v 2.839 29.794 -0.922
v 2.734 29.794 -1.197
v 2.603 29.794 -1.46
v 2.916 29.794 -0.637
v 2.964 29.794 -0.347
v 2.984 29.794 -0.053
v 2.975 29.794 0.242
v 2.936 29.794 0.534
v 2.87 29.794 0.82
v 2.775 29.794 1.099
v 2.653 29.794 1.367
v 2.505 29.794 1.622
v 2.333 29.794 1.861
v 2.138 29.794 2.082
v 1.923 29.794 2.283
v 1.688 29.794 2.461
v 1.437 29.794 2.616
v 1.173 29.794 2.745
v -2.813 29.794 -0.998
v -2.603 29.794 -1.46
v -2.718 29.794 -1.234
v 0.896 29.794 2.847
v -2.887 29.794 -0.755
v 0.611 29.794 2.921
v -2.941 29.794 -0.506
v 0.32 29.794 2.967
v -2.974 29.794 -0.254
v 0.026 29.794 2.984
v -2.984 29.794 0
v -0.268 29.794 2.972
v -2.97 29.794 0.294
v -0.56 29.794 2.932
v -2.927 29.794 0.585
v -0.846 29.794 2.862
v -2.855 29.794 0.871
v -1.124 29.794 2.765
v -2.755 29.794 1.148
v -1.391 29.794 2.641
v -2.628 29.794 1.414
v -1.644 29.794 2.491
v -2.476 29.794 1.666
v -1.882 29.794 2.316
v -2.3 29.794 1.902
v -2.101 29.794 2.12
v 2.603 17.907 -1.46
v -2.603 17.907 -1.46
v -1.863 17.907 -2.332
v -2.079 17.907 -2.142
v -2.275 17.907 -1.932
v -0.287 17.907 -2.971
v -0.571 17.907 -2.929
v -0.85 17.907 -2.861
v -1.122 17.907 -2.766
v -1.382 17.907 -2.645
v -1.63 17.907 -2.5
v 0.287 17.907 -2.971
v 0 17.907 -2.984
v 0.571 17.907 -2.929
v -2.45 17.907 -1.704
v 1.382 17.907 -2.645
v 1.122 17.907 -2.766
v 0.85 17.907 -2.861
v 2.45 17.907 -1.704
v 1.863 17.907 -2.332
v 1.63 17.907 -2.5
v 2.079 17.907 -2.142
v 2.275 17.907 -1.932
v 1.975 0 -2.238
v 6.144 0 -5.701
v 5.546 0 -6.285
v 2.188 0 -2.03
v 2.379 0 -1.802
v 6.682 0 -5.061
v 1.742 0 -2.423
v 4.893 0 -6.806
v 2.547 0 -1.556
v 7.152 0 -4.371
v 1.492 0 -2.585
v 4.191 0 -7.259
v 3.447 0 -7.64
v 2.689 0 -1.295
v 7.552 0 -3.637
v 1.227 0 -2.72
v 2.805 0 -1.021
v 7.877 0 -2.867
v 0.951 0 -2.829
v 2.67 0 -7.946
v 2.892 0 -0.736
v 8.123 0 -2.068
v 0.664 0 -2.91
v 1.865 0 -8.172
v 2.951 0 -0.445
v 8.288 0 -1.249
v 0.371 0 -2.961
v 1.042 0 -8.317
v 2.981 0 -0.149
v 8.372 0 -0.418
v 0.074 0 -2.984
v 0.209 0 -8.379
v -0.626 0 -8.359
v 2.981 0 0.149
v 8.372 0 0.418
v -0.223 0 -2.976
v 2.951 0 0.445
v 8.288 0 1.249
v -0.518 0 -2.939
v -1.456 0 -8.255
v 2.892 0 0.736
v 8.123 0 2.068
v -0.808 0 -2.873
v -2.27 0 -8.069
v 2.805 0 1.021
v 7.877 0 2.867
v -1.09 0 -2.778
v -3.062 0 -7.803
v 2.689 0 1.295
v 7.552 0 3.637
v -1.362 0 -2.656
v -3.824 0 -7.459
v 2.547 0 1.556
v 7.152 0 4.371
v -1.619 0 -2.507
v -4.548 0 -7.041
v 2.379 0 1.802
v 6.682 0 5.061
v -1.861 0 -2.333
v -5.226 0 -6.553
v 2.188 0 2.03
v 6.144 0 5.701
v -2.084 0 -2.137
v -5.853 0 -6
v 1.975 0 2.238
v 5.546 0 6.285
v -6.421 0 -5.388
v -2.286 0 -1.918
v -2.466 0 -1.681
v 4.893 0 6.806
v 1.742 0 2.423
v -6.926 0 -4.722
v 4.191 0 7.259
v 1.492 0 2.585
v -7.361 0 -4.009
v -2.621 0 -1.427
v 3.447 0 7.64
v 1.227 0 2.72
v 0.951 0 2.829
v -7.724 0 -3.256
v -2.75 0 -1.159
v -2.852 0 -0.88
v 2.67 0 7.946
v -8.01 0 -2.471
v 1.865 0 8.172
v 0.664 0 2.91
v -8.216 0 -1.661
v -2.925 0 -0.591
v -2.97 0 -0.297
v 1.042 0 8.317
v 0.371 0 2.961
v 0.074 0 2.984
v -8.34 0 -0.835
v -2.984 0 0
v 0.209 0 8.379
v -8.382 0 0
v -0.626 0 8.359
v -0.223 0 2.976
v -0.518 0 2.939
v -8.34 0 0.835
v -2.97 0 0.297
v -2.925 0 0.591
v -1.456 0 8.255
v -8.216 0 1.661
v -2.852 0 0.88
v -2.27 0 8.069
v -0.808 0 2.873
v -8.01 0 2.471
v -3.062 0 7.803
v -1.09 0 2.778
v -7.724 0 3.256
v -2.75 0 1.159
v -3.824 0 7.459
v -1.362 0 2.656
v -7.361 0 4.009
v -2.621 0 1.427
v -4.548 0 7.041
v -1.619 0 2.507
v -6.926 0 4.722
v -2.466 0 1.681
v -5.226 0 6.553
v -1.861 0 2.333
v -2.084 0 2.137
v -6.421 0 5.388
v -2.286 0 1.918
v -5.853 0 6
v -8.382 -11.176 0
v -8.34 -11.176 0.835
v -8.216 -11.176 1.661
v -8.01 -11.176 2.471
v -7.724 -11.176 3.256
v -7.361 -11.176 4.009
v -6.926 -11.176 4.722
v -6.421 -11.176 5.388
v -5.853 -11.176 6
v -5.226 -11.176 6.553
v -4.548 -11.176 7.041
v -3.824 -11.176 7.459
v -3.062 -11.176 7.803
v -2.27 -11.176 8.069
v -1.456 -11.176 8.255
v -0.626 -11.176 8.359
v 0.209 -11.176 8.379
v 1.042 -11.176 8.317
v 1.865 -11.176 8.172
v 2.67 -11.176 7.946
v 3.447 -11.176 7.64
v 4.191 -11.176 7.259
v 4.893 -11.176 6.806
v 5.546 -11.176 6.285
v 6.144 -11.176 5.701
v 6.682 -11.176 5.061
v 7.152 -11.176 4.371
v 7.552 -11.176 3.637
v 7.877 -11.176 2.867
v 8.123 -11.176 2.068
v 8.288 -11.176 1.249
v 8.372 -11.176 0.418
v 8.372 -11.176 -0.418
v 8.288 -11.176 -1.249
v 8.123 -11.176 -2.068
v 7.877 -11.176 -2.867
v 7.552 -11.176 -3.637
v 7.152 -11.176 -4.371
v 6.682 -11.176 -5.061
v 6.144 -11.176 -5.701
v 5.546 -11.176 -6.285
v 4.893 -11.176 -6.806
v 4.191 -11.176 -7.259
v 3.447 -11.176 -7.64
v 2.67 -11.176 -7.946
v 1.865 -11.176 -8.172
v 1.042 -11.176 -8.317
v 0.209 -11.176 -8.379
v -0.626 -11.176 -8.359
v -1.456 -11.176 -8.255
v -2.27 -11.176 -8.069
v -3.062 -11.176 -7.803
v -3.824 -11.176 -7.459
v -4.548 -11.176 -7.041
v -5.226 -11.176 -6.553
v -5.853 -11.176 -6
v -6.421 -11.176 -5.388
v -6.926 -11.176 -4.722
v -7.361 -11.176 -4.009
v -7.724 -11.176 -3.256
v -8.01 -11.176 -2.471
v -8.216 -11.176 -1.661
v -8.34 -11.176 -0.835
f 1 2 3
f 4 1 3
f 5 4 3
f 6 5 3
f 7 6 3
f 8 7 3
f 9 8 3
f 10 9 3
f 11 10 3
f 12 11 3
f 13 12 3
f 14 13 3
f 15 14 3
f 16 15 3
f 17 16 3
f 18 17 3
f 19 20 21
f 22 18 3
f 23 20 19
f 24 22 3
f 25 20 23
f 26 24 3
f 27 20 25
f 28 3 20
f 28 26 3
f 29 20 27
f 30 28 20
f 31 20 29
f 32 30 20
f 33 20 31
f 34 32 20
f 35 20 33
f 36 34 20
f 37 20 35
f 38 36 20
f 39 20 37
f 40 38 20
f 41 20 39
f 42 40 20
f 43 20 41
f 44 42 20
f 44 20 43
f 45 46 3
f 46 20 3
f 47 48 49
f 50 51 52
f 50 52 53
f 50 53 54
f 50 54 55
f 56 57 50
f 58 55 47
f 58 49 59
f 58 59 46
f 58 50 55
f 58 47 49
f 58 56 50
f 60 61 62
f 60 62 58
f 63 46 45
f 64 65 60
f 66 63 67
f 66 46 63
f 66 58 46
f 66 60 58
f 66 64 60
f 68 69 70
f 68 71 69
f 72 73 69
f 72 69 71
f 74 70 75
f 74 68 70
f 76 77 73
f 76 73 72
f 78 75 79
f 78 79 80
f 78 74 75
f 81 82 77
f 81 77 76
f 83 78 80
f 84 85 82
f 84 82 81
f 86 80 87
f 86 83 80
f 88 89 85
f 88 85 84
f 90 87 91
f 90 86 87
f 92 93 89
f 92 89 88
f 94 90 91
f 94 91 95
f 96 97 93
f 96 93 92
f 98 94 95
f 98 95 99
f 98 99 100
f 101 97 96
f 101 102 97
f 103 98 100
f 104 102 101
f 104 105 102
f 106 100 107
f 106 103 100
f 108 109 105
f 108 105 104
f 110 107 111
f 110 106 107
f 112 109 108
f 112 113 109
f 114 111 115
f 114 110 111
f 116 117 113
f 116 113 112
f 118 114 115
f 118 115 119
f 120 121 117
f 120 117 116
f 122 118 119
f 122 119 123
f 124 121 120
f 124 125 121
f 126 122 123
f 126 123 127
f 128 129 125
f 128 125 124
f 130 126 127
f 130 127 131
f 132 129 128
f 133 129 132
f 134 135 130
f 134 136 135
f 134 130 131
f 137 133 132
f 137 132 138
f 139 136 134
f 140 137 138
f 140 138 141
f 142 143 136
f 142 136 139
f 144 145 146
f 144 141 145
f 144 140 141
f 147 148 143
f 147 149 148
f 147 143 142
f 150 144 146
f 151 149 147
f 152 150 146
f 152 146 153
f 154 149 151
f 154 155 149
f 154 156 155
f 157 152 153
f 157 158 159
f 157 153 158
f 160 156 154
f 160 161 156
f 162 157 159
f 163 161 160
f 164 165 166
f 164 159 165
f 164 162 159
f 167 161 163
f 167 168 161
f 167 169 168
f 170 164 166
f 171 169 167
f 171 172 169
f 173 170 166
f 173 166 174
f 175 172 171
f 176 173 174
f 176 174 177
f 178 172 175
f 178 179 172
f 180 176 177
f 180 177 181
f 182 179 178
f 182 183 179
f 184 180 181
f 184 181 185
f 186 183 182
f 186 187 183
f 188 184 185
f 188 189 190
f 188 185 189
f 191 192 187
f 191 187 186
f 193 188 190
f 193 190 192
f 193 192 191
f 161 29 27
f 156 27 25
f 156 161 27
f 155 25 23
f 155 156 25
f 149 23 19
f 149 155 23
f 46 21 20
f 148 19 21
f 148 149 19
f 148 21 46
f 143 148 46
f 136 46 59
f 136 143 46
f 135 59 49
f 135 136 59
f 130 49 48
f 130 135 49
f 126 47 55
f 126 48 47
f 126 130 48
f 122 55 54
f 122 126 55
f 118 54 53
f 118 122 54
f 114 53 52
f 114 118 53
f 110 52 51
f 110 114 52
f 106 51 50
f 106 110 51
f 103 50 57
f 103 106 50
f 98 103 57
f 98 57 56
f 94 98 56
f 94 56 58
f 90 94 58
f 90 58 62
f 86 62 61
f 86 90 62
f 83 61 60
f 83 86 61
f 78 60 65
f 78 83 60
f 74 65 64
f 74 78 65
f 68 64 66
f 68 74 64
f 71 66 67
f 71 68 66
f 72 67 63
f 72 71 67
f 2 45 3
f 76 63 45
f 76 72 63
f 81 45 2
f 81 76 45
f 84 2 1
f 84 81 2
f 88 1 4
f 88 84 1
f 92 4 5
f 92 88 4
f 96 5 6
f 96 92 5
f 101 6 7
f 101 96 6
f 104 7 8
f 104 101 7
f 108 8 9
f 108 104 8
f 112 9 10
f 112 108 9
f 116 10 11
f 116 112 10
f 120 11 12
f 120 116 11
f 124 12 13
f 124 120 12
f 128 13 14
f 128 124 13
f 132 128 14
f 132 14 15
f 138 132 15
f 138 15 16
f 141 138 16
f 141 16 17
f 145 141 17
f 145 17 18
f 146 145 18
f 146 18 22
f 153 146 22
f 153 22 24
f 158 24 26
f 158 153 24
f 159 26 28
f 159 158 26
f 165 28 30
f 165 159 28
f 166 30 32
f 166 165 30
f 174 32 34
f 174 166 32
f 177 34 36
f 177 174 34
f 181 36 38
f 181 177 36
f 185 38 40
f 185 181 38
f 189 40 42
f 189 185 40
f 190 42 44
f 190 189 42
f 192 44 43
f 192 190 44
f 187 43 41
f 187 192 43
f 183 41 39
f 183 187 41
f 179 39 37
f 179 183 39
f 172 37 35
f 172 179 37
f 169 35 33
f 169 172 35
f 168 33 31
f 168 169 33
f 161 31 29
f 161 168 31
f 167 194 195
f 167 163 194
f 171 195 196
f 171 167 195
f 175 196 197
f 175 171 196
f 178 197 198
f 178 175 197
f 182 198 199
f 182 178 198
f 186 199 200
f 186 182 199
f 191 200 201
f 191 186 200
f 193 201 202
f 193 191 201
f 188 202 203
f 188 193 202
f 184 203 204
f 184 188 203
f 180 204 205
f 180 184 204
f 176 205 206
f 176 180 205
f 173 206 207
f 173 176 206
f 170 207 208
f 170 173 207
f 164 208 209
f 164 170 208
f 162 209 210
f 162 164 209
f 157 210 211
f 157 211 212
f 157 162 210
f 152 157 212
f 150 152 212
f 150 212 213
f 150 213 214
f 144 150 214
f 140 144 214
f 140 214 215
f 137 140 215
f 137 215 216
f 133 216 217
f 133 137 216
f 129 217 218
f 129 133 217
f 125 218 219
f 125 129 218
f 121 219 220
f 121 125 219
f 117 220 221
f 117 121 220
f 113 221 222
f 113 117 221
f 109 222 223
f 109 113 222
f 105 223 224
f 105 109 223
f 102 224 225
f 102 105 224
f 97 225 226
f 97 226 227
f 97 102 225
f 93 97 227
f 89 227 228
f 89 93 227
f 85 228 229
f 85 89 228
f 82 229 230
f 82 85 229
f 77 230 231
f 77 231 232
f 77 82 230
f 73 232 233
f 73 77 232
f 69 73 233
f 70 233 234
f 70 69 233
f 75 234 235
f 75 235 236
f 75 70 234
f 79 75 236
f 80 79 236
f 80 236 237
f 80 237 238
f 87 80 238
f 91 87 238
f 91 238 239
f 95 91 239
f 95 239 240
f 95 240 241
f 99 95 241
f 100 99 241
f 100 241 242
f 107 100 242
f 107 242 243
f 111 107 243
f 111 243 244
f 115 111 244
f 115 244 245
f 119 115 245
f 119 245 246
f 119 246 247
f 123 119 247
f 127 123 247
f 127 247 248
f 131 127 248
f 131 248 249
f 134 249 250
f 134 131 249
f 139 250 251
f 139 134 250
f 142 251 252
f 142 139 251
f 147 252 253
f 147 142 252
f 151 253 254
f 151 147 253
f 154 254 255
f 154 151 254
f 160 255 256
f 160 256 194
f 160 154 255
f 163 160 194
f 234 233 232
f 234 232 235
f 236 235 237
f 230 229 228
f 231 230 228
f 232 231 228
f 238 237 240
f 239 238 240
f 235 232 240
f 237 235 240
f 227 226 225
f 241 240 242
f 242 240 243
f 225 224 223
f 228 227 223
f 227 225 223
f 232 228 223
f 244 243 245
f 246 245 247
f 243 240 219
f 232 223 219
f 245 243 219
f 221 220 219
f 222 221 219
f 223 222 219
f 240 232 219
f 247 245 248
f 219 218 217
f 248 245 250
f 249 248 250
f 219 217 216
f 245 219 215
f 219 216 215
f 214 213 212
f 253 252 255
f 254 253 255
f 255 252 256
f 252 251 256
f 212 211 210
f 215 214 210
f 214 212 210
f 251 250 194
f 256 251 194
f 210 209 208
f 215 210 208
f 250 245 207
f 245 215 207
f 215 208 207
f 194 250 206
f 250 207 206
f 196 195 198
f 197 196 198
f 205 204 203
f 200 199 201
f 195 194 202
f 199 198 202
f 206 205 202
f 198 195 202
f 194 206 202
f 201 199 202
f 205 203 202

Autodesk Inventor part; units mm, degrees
ref_plane "YZ Plane" through (0, 0, 0) normal (1, 0, 0) x (0, 1, 0)
ref_plane "XZ Plane" through (0, 0, 0) normal (0, 1, 0) x (-1, 0, 0)
ref_plane "XY Plane" through (0, 0, 0) normal (0, 0, 1) x (1, 0, 0)
sketch "Sketch1" plane through (0, 0, 0) normal (0, 1, 0) x (-1, 0, 0)
  circle A0 centre (0, 0) radius 8.382
  circle A1 centre (0, 0) radius 2.9845
  dimension "d0" = 5.969
  dimension "d1" = 16.764
extrude "Extrusion1" add sketch "Sketch1" against normal blind 11.176 contours A0 | A1
extrude "Extrusion2" add sketch "Sketch1" along normal blind 29.7942 contours A1
sketch "Sketch2" plane through (0, 29.7942, 0) normal (0, 1, 0) x (1, 0, 0)
  circle A0 centre (0, 0) radius 2.9845 projected
  circle A1 centre (0, 0) radius 2.9845 projected
  line L0 (-2.6027, 1.4605) -> (2.6027, 1.4605)
  arc A2 (2.6027, 1.4605) -> (-2.6027, 1.4605) centre (0, 0) ccw
  dimension "d6" = 4.445
extrude "Extrusion3" cut sketch "Sketch2" against normal blind 11.8872 contours L0 A0 picked at (-0.1168, 1.9616)
properties part number "Potentiometer"
